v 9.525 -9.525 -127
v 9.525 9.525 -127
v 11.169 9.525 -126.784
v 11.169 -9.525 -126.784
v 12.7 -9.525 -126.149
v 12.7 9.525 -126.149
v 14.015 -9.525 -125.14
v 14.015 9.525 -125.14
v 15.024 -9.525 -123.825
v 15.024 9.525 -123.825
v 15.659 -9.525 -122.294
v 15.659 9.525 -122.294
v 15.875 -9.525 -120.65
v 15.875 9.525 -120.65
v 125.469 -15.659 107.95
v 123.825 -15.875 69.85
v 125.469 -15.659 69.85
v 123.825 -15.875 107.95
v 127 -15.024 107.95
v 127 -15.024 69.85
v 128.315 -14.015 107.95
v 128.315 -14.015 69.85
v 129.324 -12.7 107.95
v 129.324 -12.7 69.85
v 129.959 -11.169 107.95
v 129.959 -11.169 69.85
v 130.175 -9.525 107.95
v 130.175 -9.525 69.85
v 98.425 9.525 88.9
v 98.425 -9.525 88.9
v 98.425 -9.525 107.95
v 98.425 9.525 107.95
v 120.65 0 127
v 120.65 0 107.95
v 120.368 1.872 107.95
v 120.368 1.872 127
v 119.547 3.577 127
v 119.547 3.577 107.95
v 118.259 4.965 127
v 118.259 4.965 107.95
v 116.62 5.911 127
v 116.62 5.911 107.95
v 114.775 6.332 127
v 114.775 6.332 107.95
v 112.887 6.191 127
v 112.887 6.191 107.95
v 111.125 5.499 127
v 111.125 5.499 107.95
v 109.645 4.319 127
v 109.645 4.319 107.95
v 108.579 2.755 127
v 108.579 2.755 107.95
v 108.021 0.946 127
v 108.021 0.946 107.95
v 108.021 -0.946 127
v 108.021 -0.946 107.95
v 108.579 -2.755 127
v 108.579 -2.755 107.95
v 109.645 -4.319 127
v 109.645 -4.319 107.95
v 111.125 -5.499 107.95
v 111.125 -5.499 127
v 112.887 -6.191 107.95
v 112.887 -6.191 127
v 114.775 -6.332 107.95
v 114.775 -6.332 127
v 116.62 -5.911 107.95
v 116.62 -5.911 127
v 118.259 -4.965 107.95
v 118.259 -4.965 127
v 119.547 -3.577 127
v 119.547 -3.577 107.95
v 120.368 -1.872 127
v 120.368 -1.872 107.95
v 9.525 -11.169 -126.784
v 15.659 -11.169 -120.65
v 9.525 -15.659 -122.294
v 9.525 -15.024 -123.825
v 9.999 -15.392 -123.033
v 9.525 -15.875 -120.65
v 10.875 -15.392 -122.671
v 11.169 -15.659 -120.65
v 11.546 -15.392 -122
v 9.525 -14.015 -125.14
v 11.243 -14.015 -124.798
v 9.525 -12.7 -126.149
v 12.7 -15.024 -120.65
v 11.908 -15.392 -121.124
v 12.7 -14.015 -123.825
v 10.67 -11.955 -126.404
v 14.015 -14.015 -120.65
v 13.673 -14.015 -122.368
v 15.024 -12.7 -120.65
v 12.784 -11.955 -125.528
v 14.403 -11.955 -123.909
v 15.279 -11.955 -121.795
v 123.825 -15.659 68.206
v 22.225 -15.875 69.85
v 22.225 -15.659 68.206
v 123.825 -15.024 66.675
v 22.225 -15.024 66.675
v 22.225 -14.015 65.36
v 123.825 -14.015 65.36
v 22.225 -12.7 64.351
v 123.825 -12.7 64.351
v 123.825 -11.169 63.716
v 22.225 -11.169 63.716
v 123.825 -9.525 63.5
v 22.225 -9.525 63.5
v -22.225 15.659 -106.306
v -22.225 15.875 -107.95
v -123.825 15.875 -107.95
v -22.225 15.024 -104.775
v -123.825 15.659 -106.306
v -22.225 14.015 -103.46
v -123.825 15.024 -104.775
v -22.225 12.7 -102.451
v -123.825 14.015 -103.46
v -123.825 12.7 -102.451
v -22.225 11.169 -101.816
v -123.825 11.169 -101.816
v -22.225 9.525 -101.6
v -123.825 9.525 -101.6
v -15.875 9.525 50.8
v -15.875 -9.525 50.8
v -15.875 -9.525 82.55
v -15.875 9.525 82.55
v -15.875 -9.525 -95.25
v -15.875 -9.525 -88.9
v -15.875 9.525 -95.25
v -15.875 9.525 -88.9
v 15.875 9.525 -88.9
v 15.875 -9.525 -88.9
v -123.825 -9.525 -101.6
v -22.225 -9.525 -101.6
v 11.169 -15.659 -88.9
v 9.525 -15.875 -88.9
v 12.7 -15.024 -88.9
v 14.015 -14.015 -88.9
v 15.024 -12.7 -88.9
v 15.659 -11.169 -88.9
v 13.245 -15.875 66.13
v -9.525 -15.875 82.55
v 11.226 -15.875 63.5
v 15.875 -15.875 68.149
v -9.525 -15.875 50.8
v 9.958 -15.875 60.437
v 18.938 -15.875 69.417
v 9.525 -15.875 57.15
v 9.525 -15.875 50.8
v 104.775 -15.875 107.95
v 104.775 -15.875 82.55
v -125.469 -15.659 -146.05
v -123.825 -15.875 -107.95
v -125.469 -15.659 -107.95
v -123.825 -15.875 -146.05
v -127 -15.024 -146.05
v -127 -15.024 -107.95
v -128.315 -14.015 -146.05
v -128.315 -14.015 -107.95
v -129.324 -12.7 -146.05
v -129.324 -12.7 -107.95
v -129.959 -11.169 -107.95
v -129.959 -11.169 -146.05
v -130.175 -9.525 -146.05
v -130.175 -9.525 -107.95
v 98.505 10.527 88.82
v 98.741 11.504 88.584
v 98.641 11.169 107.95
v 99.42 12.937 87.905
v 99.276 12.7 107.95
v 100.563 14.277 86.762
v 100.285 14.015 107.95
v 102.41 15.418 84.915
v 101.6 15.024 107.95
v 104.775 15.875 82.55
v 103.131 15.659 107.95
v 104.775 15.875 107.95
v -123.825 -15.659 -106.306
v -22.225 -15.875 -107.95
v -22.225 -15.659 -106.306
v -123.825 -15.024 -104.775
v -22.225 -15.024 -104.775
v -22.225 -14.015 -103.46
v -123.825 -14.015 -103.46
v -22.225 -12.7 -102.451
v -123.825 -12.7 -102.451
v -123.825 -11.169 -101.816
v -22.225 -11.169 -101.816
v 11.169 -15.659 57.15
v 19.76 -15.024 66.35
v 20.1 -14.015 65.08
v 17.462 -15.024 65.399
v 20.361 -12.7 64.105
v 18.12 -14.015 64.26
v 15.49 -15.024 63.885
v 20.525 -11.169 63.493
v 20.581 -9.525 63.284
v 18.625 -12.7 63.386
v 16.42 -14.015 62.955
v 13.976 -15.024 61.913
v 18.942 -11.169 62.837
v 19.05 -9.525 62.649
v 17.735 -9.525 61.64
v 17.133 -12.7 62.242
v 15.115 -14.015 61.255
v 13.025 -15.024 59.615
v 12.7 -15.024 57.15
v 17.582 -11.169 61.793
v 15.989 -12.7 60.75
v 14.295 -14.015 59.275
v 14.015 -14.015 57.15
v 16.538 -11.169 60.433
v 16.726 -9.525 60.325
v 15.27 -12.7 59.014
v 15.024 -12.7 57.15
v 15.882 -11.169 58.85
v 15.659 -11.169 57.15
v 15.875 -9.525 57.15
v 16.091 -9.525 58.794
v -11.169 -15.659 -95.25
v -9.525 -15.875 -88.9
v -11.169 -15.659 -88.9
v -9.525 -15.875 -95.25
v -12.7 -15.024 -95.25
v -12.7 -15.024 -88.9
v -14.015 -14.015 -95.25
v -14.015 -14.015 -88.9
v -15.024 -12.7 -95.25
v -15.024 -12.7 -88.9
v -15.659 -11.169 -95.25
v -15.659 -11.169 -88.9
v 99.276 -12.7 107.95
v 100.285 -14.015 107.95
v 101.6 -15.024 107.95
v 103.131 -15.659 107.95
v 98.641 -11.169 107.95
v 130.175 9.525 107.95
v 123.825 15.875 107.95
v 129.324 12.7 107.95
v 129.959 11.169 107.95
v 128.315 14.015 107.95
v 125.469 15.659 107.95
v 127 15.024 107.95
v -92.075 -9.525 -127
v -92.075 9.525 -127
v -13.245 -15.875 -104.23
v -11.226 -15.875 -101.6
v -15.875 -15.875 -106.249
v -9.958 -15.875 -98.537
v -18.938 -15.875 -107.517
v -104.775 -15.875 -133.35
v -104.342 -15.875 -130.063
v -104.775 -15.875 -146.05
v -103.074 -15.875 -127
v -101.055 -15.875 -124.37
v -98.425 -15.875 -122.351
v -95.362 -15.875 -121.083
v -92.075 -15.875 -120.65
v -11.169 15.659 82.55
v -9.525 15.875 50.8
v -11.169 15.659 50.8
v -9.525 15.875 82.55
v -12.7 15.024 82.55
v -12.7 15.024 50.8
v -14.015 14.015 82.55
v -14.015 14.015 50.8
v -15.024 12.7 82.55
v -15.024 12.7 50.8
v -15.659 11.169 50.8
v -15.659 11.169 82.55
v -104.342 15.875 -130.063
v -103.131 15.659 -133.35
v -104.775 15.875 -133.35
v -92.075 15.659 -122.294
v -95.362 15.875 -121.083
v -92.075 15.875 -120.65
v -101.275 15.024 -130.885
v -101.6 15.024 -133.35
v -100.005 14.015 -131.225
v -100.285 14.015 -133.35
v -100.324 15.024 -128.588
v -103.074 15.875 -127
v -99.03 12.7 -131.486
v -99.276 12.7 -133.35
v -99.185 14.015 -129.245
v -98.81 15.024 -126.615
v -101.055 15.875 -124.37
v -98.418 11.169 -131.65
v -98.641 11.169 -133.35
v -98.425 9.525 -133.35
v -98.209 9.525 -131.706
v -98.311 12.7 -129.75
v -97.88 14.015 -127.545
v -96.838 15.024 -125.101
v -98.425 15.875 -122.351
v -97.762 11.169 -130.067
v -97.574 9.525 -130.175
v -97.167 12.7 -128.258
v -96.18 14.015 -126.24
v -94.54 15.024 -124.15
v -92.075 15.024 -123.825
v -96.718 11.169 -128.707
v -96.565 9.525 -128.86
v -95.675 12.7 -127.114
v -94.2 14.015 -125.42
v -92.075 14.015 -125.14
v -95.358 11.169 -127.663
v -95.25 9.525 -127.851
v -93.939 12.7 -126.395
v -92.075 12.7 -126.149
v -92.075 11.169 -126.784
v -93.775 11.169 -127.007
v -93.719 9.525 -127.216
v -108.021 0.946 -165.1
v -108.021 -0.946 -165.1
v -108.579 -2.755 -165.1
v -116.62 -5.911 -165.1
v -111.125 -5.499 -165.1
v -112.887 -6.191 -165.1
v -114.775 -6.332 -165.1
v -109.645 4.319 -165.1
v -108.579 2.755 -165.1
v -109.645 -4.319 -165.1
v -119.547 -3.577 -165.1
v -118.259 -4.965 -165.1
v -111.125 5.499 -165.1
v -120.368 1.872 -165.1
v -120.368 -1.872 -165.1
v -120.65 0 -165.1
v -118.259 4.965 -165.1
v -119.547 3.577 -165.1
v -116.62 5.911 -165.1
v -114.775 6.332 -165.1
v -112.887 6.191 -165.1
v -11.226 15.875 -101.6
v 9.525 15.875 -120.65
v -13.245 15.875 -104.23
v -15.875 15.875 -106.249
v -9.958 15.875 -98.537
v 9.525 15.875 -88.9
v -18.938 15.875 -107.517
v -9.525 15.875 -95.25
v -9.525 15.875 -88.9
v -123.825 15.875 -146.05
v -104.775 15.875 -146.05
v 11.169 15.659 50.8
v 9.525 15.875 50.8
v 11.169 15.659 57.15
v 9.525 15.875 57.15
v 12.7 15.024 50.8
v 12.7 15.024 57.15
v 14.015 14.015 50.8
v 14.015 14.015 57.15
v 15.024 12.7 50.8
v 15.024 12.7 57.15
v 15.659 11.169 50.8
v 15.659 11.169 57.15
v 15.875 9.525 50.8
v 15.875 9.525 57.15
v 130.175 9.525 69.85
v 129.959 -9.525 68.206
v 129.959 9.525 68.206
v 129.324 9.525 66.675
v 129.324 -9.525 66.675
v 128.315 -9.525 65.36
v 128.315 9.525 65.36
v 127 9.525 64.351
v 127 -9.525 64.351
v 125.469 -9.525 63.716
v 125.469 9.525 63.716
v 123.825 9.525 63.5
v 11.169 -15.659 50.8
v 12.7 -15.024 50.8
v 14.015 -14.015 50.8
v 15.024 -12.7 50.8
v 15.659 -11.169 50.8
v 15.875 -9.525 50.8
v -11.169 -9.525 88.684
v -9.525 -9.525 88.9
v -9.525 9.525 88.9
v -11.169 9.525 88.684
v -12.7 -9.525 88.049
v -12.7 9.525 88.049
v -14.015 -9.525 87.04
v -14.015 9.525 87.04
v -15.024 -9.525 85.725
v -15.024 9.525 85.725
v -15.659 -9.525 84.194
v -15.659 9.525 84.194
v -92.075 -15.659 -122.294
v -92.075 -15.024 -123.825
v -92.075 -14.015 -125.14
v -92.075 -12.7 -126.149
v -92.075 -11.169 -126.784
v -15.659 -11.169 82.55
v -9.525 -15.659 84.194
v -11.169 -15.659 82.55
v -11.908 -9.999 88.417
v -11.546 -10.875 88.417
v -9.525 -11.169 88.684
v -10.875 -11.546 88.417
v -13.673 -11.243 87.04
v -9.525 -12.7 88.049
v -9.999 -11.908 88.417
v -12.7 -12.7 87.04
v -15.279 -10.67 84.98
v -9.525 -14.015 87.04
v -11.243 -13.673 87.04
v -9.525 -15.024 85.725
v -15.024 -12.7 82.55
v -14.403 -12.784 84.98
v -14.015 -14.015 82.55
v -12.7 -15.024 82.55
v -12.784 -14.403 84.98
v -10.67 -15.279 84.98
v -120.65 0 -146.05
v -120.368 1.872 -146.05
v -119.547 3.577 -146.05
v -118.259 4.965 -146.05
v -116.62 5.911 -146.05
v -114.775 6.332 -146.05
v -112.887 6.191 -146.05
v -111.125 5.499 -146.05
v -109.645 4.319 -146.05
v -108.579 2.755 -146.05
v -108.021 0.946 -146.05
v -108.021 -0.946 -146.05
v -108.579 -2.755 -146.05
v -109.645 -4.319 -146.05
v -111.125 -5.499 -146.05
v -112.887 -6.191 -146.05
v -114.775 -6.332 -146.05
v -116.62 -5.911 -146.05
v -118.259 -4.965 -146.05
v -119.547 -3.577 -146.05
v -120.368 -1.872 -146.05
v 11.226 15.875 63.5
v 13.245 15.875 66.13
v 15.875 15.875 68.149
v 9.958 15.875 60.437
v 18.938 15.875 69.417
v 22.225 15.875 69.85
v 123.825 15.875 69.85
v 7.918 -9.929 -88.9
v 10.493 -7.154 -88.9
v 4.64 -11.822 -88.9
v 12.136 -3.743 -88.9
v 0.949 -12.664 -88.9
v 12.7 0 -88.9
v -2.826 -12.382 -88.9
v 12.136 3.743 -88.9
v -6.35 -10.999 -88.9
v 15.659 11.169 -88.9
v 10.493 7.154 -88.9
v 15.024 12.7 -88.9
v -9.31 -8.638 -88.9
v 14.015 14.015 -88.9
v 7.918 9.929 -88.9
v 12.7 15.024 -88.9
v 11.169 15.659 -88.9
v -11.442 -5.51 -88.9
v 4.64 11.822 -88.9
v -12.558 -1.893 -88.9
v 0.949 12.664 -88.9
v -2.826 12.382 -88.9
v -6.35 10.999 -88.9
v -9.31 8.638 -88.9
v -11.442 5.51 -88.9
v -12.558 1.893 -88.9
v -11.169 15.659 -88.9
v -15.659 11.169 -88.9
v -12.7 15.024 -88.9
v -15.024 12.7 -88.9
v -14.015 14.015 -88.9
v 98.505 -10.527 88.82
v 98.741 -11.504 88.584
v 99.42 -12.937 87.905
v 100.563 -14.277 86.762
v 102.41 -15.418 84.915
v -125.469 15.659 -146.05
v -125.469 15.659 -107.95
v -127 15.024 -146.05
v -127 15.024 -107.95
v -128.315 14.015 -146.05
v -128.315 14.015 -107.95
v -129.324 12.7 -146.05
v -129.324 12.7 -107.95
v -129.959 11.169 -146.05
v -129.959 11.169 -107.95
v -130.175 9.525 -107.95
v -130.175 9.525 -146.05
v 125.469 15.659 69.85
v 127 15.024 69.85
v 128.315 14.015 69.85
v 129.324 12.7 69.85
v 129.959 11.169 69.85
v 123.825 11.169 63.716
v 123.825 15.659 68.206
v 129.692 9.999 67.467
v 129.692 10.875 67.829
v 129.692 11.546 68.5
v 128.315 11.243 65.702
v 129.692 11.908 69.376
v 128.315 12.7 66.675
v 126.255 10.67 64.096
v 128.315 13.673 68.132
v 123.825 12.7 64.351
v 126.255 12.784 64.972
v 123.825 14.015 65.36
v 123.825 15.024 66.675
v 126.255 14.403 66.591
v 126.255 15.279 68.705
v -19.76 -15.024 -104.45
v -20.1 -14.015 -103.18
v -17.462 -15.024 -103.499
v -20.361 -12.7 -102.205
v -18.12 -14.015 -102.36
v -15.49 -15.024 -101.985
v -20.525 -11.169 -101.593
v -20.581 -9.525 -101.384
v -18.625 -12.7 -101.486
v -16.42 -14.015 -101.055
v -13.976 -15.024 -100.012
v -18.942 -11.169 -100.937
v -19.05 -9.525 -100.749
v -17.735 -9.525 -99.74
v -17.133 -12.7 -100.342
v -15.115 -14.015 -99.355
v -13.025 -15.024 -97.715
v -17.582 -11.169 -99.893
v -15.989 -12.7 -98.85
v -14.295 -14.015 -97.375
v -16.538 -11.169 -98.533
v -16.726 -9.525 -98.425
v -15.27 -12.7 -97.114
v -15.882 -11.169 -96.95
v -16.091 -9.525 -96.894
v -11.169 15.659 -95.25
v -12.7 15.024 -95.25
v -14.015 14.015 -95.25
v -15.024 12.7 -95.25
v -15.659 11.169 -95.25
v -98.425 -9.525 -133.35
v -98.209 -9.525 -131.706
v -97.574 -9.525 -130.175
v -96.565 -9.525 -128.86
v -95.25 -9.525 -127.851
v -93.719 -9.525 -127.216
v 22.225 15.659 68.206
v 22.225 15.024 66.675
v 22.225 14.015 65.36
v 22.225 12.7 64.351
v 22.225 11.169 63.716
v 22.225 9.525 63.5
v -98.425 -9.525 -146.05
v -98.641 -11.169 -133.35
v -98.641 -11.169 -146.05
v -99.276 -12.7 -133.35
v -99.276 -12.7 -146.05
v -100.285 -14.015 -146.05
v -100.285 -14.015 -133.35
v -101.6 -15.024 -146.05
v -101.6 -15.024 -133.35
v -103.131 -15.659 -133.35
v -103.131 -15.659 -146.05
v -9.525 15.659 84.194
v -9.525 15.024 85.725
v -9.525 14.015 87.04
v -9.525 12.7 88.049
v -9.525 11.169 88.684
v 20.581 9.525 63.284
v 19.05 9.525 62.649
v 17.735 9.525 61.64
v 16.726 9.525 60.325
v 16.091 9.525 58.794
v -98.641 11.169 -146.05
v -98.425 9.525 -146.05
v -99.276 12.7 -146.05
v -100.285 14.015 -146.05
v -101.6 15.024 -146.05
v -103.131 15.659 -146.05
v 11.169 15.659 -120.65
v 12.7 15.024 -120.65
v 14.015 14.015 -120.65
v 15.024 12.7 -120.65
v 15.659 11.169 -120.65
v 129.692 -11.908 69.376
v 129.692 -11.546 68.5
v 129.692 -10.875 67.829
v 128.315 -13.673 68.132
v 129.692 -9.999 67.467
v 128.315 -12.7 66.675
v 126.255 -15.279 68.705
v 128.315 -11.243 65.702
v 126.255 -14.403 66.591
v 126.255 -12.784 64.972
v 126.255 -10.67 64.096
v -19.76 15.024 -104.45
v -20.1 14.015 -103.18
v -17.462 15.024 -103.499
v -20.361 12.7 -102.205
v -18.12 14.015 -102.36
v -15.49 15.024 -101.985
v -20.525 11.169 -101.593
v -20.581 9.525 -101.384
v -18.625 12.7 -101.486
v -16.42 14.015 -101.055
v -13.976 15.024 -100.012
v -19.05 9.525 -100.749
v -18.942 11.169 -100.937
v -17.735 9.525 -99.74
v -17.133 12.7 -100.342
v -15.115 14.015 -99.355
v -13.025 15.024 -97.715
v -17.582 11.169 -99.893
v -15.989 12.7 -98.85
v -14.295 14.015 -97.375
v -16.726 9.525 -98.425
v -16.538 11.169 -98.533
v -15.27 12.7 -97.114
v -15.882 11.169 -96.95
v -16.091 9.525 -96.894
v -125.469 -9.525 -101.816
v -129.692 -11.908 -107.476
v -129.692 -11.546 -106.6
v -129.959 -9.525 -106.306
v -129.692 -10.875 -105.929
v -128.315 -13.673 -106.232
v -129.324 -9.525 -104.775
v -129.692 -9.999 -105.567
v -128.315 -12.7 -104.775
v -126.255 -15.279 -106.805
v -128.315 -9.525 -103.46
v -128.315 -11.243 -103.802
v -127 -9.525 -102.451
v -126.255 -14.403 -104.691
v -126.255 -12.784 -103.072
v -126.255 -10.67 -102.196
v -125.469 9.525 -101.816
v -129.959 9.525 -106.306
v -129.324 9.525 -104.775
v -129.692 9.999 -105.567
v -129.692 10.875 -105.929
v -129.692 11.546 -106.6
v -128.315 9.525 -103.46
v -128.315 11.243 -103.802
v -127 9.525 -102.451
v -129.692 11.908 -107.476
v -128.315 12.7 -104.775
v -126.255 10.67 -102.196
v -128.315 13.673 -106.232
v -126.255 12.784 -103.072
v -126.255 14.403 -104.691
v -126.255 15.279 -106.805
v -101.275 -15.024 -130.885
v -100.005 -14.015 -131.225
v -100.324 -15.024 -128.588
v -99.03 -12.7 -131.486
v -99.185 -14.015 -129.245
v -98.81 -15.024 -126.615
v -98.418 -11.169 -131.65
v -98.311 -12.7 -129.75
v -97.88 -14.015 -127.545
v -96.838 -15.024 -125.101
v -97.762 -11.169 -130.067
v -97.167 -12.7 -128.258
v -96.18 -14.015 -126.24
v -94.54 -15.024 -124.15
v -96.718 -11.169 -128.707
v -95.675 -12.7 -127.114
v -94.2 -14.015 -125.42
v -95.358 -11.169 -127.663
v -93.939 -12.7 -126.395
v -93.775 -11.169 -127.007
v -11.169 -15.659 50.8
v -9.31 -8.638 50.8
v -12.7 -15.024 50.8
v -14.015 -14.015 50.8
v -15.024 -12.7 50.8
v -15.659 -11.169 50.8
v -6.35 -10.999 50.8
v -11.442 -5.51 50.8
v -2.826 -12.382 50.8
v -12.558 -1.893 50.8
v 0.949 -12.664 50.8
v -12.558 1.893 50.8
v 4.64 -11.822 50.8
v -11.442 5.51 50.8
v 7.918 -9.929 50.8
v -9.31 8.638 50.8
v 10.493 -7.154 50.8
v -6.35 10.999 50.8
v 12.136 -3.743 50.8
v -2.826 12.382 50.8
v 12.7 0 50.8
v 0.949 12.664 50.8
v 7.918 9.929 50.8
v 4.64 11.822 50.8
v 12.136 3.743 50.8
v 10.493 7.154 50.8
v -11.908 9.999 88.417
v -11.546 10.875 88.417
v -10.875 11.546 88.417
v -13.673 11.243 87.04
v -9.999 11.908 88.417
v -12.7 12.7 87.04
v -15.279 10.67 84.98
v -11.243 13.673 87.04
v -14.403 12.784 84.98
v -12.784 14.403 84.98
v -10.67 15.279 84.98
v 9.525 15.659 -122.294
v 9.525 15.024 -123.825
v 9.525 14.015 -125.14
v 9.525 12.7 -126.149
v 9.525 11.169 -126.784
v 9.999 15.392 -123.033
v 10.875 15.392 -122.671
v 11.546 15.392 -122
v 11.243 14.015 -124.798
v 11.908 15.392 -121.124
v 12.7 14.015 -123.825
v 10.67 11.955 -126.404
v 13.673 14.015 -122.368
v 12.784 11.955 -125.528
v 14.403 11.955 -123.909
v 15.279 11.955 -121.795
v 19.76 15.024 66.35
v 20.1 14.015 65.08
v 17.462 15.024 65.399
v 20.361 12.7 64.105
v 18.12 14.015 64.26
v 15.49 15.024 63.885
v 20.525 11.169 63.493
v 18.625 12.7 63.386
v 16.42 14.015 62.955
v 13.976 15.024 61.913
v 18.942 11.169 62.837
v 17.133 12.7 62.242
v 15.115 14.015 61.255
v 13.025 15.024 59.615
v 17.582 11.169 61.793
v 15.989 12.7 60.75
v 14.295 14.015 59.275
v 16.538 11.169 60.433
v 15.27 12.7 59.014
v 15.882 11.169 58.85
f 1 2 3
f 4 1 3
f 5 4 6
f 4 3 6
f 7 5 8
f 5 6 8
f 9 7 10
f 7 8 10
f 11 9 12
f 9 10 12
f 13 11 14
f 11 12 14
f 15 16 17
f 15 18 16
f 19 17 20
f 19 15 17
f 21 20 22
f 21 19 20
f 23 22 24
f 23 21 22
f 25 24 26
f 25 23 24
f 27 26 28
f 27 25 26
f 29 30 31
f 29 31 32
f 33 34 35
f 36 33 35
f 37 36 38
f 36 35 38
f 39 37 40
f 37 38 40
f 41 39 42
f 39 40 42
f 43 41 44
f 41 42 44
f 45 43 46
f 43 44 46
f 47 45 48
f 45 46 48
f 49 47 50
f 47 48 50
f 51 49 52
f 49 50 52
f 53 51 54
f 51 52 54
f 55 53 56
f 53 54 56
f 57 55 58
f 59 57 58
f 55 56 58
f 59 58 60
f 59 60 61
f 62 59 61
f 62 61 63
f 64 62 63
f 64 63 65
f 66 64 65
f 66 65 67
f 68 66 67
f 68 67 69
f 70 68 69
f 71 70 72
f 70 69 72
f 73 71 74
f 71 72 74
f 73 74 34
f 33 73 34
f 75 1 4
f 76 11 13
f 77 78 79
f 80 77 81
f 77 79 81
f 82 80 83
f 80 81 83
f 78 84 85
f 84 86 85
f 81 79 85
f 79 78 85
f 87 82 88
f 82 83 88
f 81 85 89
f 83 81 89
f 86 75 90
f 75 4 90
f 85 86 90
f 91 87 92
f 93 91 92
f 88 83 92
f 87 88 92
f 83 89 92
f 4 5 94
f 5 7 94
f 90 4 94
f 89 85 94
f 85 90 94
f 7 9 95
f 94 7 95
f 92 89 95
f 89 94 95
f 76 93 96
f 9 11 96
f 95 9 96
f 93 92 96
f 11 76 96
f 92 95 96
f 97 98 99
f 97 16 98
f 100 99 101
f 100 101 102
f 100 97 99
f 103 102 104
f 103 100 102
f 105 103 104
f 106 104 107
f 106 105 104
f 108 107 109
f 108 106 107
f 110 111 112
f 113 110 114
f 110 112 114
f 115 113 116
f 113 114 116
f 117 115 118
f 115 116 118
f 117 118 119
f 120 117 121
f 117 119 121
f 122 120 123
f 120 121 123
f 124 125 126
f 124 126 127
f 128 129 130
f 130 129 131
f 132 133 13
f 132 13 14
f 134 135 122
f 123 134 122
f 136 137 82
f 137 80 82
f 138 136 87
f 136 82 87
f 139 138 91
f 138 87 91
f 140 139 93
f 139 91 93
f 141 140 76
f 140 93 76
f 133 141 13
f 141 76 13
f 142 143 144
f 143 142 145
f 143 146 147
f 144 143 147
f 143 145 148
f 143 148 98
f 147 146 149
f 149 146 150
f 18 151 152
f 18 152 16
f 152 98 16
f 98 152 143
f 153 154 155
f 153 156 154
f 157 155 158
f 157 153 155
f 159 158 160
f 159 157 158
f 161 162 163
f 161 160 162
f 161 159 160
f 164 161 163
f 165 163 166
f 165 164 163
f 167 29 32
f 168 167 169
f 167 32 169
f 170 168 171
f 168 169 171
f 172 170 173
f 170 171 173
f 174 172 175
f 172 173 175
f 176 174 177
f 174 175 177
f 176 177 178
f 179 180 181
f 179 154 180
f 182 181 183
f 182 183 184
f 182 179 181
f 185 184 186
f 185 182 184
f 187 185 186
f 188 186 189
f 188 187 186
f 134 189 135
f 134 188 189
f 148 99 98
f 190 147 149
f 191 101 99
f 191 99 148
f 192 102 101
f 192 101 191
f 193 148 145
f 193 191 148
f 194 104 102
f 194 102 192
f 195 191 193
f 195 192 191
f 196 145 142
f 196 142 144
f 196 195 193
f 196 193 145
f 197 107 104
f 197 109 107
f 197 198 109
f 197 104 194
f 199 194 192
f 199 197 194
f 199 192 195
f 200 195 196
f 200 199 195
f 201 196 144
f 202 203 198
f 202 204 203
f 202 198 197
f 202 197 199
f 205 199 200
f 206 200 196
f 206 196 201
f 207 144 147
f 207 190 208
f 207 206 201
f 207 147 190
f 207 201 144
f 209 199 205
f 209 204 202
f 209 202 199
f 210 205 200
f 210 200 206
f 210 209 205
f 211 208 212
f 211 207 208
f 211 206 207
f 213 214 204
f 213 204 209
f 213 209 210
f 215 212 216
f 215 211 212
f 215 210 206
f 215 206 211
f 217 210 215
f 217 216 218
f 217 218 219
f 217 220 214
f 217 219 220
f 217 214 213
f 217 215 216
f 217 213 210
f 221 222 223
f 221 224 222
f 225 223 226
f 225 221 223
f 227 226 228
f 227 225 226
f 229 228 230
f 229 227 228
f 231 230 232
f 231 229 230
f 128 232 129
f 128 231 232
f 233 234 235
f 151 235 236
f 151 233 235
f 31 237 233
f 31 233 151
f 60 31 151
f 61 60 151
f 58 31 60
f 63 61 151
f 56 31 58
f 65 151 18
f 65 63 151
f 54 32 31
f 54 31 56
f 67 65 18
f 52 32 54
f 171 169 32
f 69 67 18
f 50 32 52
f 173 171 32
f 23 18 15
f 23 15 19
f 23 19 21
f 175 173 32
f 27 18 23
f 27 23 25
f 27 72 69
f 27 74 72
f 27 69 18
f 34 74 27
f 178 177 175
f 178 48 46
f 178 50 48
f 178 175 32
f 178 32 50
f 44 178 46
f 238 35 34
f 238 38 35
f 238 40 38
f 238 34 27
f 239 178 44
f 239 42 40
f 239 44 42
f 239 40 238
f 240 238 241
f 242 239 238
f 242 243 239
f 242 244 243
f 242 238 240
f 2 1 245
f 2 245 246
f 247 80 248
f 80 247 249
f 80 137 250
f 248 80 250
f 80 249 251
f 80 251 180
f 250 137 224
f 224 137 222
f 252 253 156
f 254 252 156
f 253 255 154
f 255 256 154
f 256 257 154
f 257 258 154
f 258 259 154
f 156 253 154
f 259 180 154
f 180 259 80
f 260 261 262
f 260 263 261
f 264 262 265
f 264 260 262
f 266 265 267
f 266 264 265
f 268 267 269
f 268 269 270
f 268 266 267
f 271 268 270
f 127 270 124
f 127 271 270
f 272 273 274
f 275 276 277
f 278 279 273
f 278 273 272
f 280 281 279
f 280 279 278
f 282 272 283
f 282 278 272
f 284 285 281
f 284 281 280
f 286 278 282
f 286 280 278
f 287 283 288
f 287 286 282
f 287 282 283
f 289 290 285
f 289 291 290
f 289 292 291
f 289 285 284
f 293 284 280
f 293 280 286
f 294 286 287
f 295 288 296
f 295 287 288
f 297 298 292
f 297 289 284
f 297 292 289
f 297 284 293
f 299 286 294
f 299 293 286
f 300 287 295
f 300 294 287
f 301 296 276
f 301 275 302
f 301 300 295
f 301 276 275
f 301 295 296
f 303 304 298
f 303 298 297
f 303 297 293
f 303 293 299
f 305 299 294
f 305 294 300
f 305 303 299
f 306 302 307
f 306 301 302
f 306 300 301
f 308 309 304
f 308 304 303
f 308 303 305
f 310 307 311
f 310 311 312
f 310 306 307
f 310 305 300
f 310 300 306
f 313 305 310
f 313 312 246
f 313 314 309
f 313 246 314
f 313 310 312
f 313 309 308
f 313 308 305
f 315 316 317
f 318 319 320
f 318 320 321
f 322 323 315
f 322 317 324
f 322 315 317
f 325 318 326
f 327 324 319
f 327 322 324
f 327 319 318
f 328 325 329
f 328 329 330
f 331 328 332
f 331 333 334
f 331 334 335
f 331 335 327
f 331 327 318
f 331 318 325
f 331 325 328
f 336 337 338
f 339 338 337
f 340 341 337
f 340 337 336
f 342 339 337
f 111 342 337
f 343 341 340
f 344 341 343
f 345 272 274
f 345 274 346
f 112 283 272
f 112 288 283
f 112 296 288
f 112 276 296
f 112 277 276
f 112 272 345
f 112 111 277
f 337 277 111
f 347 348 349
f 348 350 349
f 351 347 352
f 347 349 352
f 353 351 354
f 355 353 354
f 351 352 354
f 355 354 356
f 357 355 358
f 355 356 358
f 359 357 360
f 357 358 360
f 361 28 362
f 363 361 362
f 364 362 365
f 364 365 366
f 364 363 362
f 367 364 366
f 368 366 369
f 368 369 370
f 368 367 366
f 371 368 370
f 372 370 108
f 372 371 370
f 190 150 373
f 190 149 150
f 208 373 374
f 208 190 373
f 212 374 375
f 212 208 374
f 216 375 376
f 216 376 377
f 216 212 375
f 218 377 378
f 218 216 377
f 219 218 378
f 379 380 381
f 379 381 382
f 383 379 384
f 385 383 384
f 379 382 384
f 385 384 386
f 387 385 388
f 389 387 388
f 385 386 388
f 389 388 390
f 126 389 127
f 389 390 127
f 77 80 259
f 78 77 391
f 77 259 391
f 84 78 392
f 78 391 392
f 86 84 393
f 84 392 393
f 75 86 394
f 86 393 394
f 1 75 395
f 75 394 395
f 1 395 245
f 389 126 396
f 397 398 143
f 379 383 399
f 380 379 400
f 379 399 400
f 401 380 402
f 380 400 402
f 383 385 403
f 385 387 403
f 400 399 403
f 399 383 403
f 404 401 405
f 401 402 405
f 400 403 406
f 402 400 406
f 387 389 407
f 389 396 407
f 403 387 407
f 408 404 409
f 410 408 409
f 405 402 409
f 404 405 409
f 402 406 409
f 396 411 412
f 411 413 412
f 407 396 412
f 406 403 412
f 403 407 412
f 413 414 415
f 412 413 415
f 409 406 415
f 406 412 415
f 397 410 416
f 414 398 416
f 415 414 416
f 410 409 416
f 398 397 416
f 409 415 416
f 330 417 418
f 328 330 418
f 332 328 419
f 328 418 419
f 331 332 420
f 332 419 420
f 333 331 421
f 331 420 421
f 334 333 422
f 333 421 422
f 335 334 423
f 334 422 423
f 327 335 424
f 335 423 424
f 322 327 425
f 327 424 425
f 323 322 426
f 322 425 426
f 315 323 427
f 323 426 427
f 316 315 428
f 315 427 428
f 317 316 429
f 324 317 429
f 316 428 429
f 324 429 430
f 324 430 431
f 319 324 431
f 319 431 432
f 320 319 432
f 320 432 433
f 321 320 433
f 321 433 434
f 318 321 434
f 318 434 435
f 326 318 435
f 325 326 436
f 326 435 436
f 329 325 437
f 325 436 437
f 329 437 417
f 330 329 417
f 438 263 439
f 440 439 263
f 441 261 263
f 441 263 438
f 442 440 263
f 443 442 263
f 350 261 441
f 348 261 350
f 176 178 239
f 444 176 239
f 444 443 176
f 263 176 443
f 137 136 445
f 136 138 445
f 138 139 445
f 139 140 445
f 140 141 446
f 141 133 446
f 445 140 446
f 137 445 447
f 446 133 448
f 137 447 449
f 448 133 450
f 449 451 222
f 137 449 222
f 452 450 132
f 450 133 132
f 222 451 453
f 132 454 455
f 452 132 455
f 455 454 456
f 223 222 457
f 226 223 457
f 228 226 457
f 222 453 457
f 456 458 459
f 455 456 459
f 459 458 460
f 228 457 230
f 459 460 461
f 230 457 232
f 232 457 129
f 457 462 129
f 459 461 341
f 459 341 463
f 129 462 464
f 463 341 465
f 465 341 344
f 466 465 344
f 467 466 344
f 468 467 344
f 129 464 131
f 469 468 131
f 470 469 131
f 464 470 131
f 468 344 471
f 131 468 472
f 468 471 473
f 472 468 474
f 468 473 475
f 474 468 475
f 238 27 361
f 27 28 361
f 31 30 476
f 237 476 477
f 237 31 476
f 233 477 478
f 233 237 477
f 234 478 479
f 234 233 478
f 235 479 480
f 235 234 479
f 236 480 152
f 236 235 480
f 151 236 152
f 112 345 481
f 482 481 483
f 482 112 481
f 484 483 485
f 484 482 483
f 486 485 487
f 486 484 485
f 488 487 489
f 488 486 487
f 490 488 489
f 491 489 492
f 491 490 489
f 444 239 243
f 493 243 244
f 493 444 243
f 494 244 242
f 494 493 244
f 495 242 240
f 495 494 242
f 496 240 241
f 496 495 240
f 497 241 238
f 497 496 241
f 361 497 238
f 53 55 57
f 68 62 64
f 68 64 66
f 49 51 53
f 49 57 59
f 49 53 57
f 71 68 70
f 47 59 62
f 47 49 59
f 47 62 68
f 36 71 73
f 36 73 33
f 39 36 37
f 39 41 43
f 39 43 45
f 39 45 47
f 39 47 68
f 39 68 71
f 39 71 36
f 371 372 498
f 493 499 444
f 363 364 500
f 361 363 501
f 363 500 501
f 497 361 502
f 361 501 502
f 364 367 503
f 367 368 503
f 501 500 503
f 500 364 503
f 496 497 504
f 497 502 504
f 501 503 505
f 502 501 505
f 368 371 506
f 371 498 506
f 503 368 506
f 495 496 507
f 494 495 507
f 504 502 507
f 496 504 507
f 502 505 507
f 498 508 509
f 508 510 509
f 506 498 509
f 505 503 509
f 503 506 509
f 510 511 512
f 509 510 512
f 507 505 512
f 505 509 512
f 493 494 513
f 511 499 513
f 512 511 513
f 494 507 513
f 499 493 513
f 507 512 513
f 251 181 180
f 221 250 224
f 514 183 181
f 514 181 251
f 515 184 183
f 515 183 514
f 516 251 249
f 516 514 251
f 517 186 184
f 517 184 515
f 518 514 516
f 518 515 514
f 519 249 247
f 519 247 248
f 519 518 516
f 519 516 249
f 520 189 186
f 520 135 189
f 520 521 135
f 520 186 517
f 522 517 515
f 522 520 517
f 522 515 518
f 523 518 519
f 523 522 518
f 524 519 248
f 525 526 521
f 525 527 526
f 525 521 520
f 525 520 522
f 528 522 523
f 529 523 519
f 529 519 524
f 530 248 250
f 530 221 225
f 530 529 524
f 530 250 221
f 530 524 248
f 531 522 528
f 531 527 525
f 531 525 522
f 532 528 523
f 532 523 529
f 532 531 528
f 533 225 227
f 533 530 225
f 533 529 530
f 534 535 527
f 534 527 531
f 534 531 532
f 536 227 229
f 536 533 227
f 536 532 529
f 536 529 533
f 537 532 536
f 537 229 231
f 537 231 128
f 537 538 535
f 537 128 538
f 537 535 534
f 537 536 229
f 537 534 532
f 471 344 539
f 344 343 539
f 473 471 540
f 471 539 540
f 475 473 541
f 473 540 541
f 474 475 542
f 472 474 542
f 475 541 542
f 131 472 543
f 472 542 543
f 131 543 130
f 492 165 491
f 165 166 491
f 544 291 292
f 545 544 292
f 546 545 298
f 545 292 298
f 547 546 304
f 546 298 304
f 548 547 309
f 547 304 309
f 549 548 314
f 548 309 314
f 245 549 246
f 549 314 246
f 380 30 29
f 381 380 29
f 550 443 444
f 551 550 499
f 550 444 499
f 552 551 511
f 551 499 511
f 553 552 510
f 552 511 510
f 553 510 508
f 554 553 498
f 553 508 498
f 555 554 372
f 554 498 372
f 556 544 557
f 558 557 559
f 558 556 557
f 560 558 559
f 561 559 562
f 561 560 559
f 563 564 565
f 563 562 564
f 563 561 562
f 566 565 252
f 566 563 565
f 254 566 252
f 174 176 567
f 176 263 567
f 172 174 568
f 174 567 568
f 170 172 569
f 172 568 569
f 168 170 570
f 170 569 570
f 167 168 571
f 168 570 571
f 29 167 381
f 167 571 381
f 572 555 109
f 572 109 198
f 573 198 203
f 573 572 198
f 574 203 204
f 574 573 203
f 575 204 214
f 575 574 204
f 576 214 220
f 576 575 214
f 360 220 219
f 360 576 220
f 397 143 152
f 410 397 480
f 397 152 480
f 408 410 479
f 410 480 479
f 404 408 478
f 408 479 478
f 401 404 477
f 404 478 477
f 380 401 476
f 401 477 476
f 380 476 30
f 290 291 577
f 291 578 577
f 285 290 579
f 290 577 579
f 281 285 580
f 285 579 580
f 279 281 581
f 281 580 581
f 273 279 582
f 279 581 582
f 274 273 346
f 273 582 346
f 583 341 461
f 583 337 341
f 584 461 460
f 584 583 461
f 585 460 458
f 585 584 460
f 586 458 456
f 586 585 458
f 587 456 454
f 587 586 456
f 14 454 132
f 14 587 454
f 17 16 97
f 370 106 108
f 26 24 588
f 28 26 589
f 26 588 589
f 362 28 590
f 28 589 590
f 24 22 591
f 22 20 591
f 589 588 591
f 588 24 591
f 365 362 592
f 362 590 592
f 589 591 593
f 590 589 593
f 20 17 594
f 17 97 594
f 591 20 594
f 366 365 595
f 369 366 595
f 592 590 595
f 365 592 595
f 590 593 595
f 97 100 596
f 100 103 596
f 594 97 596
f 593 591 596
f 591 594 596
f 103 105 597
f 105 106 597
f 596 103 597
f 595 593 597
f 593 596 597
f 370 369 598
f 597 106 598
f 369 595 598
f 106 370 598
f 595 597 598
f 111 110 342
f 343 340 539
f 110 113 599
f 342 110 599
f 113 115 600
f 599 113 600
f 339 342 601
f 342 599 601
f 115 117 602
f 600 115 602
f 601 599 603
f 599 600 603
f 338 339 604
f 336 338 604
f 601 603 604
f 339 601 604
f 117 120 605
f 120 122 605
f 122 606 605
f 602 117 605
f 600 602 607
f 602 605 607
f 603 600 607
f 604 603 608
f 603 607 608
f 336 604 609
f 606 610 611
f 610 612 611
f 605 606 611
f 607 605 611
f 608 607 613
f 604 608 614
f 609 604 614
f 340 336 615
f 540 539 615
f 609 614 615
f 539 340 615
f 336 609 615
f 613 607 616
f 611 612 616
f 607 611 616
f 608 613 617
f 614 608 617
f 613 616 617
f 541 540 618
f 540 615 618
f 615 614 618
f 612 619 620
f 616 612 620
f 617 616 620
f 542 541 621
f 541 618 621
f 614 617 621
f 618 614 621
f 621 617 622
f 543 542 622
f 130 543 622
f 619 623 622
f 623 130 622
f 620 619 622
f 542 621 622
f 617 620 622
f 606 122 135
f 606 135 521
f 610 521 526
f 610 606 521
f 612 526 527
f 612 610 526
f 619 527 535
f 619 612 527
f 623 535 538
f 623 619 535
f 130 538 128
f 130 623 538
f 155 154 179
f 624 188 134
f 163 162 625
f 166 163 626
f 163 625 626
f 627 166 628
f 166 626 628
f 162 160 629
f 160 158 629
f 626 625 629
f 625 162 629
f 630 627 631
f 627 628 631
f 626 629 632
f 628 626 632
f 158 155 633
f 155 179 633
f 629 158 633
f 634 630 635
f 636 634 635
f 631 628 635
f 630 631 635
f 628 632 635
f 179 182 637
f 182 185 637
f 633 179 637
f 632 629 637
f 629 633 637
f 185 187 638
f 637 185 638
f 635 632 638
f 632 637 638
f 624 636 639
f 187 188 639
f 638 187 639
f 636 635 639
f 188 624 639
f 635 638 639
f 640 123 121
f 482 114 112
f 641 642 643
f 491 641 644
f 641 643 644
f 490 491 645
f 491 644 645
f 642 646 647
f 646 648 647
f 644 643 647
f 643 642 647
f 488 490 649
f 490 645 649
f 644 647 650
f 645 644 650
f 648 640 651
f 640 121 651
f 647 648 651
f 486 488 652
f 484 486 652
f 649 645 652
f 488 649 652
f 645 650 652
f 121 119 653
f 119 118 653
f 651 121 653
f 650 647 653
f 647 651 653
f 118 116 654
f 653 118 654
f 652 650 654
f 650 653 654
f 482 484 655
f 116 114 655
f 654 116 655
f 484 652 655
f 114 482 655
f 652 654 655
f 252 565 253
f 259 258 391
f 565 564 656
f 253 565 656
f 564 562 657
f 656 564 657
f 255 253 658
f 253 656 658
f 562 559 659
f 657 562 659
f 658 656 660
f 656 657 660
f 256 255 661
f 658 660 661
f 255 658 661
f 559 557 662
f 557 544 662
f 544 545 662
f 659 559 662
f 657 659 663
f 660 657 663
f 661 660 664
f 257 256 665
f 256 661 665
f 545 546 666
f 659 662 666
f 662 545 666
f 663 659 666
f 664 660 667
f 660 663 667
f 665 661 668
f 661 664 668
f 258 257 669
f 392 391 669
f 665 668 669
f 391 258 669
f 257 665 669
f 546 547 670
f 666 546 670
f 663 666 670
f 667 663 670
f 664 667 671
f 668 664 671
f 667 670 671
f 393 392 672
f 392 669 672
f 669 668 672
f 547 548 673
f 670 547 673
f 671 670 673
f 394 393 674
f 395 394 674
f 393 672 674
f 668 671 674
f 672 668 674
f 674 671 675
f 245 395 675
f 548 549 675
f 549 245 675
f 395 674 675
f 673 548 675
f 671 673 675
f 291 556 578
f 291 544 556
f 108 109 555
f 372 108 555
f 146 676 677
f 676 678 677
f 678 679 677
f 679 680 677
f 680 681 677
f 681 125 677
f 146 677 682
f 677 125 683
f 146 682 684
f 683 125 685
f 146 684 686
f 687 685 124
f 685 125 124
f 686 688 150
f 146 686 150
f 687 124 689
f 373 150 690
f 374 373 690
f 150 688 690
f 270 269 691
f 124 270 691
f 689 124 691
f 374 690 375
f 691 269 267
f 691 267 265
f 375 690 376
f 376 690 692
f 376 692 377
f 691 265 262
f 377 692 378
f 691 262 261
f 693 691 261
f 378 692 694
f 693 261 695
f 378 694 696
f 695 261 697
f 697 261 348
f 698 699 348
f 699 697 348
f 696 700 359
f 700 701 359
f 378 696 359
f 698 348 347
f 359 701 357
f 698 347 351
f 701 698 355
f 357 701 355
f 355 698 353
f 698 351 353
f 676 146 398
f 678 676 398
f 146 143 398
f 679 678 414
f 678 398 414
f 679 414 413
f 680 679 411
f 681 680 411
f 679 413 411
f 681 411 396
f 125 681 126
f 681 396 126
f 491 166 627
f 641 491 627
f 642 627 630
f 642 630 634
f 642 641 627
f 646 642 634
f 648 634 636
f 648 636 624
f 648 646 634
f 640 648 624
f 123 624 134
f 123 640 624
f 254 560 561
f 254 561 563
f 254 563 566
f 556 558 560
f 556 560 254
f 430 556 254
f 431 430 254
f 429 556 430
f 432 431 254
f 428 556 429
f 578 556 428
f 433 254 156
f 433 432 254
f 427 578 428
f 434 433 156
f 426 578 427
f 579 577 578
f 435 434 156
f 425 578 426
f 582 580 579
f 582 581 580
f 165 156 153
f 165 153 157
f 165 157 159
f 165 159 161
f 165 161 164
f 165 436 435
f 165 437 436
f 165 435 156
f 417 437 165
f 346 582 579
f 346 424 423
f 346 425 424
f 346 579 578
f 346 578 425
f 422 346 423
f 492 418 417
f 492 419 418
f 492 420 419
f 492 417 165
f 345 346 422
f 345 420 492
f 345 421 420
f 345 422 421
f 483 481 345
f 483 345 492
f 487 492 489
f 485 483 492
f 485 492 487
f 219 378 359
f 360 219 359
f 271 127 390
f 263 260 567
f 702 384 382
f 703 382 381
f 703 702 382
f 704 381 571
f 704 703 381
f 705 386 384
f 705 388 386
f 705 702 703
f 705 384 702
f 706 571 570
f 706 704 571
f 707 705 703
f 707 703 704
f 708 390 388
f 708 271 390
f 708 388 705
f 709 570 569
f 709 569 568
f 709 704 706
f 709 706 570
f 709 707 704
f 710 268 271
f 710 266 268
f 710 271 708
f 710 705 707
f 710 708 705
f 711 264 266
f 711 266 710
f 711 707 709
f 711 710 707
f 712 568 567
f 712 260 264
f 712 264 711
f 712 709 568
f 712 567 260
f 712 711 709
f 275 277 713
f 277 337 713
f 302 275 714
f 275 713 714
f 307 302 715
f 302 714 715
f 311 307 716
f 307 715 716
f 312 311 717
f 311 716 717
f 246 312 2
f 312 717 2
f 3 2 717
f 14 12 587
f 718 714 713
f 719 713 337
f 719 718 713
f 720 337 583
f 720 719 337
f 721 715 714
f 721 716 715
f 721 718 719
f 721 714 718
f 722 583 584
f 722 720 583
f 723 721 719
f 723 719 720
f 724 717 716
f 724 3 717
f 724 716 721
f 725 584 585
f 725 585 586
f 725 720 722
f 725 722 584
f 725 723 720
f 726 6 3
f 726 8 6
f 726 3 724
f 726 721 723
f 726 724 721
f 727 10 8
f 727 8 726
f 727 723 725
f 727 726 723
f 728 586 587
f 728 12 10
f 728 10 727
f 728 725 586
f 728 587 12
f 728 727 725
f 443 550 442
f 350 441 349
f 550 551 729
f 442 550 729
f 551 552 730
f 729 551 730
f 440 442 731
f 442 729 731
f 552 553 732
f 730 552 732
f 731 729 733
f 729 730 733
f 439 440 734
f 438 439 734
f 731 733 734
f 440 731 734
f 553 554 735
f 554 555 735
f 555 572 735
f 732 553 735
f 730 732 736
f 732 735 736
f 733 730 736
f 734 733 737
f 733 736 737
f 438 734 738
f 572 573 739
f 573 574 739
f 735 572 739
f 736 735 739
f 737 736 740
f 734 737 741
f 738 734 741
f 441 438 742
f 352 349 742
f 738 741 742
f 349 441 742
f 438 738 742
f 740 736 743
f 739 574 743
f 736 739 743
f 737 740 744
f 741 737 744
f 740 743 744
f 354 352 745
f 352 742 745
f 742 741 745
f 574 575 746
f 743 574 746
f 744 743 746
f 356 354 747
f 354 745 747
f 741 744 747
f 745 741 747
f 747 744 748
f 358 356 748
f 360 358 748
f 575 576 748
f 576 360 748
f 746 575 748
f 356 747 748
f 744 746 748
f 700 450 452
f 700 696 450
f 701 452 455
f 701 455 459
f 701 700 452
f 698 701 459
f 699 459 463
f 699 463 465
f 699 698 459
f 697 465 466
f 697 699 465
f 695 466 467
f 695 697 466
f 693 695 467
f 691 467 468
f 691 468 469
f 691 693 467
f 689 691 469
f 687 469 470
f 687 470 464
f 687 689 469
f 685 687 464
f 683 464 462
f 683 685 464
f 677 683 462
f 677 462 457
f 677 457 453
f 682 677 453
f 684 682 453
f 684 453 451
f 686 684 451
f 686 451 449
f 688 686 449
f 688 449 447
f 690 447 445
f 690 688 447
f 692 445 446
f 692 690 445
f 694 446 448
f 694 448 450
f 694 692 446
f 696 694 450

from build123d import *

# Parameters (mm, degrees)
CROQUIS3_R                   = 12.7
SALIENTE_EXTRUIR1_DEPTH      = 50.8
SALIENTE_EXTRUIR1_DEPTH_BACK = 88.9
CROQUIS4_W                   = 31.75
CROQUIS4_H                   = 31.75
SALIENTE_EXTRUIR2_DEPTH      = 38.1
CROQUIS6_W                   = 25.4
CROQUIS6_H                   = 31.75
SALIENTE_EXTRUIR3_DEPTH      = 114.3
CROQUIS8_W                   = 31.75
CROQUIS8_H                   = 31.75
SALIENTE_EXTRUIR4_DEPTH      = 19.05
CROQUIS9_R                   = 6.35
SALIENTE_EXTRUIR5_DEPTH      = 19.05
REDONDEO1_R                  = 6.35
CROQUIS12_W                  = 31.75
CROQUIS12_H                  = 31.75
SALIENTE_EXTRUIR6_DEPTH      = 38.1
CROQUIS13_W                  = 25.4
CROQUIS13_H                  = 31.75
SALIENTE_EXTRUIR7_DEPTH      = 114.3
CROQUIS14_W                  = 31.75
CROQUIS14_H                  = 31.75
SALIENTE_EXTRUIR8_DEPTH      = 19.05
CROQUIS16_R                  = 6.35
SALIENTE_EXTRUIR9_DEPTH      = 19.05
REDONDEO2_R                  = 6.35


with BuildPart() as part:
    # Croquis3 → Saliente-Extruir1 (new body, two sides)
    with BuildSketch(Plane.XY) as saliente_extruir1_sk:
        Circle(CROQUIS3_R)
    extrude(amount=SALIENTE_EXTRUIR1_DEPTH)
    extrude(saliente_extruir1_sk.sketch, amount=-SALIENTE_EXTRUIR1_DEPTH_BACK)

    # Croquis4 → Saliente-Extruir2 (add)
    with BuildSketch(Plane(origin=(0, 0, -88.9), x_dir=(-1, 0, 0), z_dir=(0, 0, -1))):
        Rectangle(CROQUIS4_W, CROQUIS4_H)
    extrude(amount=SALIENTE_EXTRUIR2_DEPTH)

    # Croquis6 → Saliente-Extruir3 (add)
    with BuildSketch(Plane.ZY.offset(15.875)):
        with Locations((-114.3, 0)):
            Rectangle(CROQUIS6_W, CROQUIS6_H)
    extrude(amount=SALIENTE_EXTRUIR3_DEPTH)

    # Croquis8 → Saliente-Extruir4 (add)
    with BuildSketch(Plane(origin=(0, 0, -127), x_dir=(-1, 0, 0), z_dir=(0, 0, -1))):
        with Locations((114.3, 0)):
            Rectangle(CROQUIS8_W, CROQUIS8_H)
    extrude(amount=SALIENTE_EXTRUIR4_DEPTH)

    # Croquis9 → Saliente-Extruir5 (add)
    with BuildSketch(Plane(origin=(0, 0, -146.05), x_dir=(-1, 0, 0), z_dir=(0, 0, -1))):
        with Locations((114.3, 0)):
            Circle(CROQUIS9_R)
    extrude(amount=SALIENTE_EXTRUIR5_DEPTH)

    # Redondeo1
    redondeo1_edges = [part.edges().sort_by_distance(p)[0] for p in [
        (15.875, 0, -127),
        (-41.275, -15.875, -127),
        (-15.875, 15.875, -95.25),
        (-15.875, -15.875, -95.25),
        (-15.875, 0, -101.6),
        (-73.025, -15.875, -101.6),
        (-73.025, 15.875, -101.6),
        (-130.175, -15.875, -123.825),
        (-130.175, 0, -101.6),
        (-130.175, 15.875, -123.825),
        (-41.275, 15.875, -127),
        (-98.425, 0, -127),
        (-98.425, 15.875, -136.525),
        (-98.425, -15.875, -136.525),
        (15.875, 15.875, -107.95),
        (15.875, -15.875, -107.95),
    ]]
    fillet(redondeo1_edges, radius=REDONDEO1_R)

    # Croquis12 → Saliente-Extruir6 (add)
    with BuildSketch(Plane.XY.offset(50.8)):
        Rectangle(CROQUIS12_W, CROQUIS12_H)
    extrude(amount=SALIENTE_EXTRUIR6_DEPTH)

    # Croquis13 → Saliente-Extruir7 (add)
    with BuildSketch(Plane(origin=(15.875, 0, 0), x_dir=(0, 0, -1), z_dir=(1, 0, 0))):
        with Locations((-76.2, 0)):
            Rectangle(CROQUIS13_W, CROQUIS13_H)
    extrude(amount=SALIENTE_EXTRUIR7_DEPTH)

    # Croquis14 → Saliente-Extruir8 (add)
    with BuildSketch(Plane.XY.offset(88.9)):
        with Locations((114.3, 0)):
            Rectangle(CROQUIS14_W, CROQUIS14_H)
    extrude(amount=SALIENTE_EXTRUIR8_DEPTH)

    # Croquis16 → Saliente-Extruir9 (add)
    with BuildSketch(Plane.XY.offset(107.95)):
        with Locations((114.3, 0)):
            Circle(CROQUIS16_R)
    extrude(amount=SALIENTE_EXTRUIR9_DEPTH)

    # Redondeo2
    redondeo2_edges = [part.edges().sort_by_distance(p)[0] for p in [
        (-15.875, 15.875, 69.85),
        (-15.875, -15.875, 69.85),
        (-15.875, 0, 88.9),
        (41.275, -15.875, 88.9),
        (15.875, 15.875, 57.15),
        (15.875, -15.875, 57.15),
        (15.875, 0, 63.5),
        (73.025, -15.875, 63.5),
        (73.025, 15.875, 63.5),
        (130.175, -15.875, 85.725),
        (130.175, 0, 63.5),
        (130.175, 15.875, 85.725),
        (41.275, 15.875, 88.9),
        (98.425, 15.875, 98.425),
        (98.425, -15.875, 98.425),
    ]]
    fillet(redondeo2_edges, radius=REDONDEO2_R)


solid = part.part
